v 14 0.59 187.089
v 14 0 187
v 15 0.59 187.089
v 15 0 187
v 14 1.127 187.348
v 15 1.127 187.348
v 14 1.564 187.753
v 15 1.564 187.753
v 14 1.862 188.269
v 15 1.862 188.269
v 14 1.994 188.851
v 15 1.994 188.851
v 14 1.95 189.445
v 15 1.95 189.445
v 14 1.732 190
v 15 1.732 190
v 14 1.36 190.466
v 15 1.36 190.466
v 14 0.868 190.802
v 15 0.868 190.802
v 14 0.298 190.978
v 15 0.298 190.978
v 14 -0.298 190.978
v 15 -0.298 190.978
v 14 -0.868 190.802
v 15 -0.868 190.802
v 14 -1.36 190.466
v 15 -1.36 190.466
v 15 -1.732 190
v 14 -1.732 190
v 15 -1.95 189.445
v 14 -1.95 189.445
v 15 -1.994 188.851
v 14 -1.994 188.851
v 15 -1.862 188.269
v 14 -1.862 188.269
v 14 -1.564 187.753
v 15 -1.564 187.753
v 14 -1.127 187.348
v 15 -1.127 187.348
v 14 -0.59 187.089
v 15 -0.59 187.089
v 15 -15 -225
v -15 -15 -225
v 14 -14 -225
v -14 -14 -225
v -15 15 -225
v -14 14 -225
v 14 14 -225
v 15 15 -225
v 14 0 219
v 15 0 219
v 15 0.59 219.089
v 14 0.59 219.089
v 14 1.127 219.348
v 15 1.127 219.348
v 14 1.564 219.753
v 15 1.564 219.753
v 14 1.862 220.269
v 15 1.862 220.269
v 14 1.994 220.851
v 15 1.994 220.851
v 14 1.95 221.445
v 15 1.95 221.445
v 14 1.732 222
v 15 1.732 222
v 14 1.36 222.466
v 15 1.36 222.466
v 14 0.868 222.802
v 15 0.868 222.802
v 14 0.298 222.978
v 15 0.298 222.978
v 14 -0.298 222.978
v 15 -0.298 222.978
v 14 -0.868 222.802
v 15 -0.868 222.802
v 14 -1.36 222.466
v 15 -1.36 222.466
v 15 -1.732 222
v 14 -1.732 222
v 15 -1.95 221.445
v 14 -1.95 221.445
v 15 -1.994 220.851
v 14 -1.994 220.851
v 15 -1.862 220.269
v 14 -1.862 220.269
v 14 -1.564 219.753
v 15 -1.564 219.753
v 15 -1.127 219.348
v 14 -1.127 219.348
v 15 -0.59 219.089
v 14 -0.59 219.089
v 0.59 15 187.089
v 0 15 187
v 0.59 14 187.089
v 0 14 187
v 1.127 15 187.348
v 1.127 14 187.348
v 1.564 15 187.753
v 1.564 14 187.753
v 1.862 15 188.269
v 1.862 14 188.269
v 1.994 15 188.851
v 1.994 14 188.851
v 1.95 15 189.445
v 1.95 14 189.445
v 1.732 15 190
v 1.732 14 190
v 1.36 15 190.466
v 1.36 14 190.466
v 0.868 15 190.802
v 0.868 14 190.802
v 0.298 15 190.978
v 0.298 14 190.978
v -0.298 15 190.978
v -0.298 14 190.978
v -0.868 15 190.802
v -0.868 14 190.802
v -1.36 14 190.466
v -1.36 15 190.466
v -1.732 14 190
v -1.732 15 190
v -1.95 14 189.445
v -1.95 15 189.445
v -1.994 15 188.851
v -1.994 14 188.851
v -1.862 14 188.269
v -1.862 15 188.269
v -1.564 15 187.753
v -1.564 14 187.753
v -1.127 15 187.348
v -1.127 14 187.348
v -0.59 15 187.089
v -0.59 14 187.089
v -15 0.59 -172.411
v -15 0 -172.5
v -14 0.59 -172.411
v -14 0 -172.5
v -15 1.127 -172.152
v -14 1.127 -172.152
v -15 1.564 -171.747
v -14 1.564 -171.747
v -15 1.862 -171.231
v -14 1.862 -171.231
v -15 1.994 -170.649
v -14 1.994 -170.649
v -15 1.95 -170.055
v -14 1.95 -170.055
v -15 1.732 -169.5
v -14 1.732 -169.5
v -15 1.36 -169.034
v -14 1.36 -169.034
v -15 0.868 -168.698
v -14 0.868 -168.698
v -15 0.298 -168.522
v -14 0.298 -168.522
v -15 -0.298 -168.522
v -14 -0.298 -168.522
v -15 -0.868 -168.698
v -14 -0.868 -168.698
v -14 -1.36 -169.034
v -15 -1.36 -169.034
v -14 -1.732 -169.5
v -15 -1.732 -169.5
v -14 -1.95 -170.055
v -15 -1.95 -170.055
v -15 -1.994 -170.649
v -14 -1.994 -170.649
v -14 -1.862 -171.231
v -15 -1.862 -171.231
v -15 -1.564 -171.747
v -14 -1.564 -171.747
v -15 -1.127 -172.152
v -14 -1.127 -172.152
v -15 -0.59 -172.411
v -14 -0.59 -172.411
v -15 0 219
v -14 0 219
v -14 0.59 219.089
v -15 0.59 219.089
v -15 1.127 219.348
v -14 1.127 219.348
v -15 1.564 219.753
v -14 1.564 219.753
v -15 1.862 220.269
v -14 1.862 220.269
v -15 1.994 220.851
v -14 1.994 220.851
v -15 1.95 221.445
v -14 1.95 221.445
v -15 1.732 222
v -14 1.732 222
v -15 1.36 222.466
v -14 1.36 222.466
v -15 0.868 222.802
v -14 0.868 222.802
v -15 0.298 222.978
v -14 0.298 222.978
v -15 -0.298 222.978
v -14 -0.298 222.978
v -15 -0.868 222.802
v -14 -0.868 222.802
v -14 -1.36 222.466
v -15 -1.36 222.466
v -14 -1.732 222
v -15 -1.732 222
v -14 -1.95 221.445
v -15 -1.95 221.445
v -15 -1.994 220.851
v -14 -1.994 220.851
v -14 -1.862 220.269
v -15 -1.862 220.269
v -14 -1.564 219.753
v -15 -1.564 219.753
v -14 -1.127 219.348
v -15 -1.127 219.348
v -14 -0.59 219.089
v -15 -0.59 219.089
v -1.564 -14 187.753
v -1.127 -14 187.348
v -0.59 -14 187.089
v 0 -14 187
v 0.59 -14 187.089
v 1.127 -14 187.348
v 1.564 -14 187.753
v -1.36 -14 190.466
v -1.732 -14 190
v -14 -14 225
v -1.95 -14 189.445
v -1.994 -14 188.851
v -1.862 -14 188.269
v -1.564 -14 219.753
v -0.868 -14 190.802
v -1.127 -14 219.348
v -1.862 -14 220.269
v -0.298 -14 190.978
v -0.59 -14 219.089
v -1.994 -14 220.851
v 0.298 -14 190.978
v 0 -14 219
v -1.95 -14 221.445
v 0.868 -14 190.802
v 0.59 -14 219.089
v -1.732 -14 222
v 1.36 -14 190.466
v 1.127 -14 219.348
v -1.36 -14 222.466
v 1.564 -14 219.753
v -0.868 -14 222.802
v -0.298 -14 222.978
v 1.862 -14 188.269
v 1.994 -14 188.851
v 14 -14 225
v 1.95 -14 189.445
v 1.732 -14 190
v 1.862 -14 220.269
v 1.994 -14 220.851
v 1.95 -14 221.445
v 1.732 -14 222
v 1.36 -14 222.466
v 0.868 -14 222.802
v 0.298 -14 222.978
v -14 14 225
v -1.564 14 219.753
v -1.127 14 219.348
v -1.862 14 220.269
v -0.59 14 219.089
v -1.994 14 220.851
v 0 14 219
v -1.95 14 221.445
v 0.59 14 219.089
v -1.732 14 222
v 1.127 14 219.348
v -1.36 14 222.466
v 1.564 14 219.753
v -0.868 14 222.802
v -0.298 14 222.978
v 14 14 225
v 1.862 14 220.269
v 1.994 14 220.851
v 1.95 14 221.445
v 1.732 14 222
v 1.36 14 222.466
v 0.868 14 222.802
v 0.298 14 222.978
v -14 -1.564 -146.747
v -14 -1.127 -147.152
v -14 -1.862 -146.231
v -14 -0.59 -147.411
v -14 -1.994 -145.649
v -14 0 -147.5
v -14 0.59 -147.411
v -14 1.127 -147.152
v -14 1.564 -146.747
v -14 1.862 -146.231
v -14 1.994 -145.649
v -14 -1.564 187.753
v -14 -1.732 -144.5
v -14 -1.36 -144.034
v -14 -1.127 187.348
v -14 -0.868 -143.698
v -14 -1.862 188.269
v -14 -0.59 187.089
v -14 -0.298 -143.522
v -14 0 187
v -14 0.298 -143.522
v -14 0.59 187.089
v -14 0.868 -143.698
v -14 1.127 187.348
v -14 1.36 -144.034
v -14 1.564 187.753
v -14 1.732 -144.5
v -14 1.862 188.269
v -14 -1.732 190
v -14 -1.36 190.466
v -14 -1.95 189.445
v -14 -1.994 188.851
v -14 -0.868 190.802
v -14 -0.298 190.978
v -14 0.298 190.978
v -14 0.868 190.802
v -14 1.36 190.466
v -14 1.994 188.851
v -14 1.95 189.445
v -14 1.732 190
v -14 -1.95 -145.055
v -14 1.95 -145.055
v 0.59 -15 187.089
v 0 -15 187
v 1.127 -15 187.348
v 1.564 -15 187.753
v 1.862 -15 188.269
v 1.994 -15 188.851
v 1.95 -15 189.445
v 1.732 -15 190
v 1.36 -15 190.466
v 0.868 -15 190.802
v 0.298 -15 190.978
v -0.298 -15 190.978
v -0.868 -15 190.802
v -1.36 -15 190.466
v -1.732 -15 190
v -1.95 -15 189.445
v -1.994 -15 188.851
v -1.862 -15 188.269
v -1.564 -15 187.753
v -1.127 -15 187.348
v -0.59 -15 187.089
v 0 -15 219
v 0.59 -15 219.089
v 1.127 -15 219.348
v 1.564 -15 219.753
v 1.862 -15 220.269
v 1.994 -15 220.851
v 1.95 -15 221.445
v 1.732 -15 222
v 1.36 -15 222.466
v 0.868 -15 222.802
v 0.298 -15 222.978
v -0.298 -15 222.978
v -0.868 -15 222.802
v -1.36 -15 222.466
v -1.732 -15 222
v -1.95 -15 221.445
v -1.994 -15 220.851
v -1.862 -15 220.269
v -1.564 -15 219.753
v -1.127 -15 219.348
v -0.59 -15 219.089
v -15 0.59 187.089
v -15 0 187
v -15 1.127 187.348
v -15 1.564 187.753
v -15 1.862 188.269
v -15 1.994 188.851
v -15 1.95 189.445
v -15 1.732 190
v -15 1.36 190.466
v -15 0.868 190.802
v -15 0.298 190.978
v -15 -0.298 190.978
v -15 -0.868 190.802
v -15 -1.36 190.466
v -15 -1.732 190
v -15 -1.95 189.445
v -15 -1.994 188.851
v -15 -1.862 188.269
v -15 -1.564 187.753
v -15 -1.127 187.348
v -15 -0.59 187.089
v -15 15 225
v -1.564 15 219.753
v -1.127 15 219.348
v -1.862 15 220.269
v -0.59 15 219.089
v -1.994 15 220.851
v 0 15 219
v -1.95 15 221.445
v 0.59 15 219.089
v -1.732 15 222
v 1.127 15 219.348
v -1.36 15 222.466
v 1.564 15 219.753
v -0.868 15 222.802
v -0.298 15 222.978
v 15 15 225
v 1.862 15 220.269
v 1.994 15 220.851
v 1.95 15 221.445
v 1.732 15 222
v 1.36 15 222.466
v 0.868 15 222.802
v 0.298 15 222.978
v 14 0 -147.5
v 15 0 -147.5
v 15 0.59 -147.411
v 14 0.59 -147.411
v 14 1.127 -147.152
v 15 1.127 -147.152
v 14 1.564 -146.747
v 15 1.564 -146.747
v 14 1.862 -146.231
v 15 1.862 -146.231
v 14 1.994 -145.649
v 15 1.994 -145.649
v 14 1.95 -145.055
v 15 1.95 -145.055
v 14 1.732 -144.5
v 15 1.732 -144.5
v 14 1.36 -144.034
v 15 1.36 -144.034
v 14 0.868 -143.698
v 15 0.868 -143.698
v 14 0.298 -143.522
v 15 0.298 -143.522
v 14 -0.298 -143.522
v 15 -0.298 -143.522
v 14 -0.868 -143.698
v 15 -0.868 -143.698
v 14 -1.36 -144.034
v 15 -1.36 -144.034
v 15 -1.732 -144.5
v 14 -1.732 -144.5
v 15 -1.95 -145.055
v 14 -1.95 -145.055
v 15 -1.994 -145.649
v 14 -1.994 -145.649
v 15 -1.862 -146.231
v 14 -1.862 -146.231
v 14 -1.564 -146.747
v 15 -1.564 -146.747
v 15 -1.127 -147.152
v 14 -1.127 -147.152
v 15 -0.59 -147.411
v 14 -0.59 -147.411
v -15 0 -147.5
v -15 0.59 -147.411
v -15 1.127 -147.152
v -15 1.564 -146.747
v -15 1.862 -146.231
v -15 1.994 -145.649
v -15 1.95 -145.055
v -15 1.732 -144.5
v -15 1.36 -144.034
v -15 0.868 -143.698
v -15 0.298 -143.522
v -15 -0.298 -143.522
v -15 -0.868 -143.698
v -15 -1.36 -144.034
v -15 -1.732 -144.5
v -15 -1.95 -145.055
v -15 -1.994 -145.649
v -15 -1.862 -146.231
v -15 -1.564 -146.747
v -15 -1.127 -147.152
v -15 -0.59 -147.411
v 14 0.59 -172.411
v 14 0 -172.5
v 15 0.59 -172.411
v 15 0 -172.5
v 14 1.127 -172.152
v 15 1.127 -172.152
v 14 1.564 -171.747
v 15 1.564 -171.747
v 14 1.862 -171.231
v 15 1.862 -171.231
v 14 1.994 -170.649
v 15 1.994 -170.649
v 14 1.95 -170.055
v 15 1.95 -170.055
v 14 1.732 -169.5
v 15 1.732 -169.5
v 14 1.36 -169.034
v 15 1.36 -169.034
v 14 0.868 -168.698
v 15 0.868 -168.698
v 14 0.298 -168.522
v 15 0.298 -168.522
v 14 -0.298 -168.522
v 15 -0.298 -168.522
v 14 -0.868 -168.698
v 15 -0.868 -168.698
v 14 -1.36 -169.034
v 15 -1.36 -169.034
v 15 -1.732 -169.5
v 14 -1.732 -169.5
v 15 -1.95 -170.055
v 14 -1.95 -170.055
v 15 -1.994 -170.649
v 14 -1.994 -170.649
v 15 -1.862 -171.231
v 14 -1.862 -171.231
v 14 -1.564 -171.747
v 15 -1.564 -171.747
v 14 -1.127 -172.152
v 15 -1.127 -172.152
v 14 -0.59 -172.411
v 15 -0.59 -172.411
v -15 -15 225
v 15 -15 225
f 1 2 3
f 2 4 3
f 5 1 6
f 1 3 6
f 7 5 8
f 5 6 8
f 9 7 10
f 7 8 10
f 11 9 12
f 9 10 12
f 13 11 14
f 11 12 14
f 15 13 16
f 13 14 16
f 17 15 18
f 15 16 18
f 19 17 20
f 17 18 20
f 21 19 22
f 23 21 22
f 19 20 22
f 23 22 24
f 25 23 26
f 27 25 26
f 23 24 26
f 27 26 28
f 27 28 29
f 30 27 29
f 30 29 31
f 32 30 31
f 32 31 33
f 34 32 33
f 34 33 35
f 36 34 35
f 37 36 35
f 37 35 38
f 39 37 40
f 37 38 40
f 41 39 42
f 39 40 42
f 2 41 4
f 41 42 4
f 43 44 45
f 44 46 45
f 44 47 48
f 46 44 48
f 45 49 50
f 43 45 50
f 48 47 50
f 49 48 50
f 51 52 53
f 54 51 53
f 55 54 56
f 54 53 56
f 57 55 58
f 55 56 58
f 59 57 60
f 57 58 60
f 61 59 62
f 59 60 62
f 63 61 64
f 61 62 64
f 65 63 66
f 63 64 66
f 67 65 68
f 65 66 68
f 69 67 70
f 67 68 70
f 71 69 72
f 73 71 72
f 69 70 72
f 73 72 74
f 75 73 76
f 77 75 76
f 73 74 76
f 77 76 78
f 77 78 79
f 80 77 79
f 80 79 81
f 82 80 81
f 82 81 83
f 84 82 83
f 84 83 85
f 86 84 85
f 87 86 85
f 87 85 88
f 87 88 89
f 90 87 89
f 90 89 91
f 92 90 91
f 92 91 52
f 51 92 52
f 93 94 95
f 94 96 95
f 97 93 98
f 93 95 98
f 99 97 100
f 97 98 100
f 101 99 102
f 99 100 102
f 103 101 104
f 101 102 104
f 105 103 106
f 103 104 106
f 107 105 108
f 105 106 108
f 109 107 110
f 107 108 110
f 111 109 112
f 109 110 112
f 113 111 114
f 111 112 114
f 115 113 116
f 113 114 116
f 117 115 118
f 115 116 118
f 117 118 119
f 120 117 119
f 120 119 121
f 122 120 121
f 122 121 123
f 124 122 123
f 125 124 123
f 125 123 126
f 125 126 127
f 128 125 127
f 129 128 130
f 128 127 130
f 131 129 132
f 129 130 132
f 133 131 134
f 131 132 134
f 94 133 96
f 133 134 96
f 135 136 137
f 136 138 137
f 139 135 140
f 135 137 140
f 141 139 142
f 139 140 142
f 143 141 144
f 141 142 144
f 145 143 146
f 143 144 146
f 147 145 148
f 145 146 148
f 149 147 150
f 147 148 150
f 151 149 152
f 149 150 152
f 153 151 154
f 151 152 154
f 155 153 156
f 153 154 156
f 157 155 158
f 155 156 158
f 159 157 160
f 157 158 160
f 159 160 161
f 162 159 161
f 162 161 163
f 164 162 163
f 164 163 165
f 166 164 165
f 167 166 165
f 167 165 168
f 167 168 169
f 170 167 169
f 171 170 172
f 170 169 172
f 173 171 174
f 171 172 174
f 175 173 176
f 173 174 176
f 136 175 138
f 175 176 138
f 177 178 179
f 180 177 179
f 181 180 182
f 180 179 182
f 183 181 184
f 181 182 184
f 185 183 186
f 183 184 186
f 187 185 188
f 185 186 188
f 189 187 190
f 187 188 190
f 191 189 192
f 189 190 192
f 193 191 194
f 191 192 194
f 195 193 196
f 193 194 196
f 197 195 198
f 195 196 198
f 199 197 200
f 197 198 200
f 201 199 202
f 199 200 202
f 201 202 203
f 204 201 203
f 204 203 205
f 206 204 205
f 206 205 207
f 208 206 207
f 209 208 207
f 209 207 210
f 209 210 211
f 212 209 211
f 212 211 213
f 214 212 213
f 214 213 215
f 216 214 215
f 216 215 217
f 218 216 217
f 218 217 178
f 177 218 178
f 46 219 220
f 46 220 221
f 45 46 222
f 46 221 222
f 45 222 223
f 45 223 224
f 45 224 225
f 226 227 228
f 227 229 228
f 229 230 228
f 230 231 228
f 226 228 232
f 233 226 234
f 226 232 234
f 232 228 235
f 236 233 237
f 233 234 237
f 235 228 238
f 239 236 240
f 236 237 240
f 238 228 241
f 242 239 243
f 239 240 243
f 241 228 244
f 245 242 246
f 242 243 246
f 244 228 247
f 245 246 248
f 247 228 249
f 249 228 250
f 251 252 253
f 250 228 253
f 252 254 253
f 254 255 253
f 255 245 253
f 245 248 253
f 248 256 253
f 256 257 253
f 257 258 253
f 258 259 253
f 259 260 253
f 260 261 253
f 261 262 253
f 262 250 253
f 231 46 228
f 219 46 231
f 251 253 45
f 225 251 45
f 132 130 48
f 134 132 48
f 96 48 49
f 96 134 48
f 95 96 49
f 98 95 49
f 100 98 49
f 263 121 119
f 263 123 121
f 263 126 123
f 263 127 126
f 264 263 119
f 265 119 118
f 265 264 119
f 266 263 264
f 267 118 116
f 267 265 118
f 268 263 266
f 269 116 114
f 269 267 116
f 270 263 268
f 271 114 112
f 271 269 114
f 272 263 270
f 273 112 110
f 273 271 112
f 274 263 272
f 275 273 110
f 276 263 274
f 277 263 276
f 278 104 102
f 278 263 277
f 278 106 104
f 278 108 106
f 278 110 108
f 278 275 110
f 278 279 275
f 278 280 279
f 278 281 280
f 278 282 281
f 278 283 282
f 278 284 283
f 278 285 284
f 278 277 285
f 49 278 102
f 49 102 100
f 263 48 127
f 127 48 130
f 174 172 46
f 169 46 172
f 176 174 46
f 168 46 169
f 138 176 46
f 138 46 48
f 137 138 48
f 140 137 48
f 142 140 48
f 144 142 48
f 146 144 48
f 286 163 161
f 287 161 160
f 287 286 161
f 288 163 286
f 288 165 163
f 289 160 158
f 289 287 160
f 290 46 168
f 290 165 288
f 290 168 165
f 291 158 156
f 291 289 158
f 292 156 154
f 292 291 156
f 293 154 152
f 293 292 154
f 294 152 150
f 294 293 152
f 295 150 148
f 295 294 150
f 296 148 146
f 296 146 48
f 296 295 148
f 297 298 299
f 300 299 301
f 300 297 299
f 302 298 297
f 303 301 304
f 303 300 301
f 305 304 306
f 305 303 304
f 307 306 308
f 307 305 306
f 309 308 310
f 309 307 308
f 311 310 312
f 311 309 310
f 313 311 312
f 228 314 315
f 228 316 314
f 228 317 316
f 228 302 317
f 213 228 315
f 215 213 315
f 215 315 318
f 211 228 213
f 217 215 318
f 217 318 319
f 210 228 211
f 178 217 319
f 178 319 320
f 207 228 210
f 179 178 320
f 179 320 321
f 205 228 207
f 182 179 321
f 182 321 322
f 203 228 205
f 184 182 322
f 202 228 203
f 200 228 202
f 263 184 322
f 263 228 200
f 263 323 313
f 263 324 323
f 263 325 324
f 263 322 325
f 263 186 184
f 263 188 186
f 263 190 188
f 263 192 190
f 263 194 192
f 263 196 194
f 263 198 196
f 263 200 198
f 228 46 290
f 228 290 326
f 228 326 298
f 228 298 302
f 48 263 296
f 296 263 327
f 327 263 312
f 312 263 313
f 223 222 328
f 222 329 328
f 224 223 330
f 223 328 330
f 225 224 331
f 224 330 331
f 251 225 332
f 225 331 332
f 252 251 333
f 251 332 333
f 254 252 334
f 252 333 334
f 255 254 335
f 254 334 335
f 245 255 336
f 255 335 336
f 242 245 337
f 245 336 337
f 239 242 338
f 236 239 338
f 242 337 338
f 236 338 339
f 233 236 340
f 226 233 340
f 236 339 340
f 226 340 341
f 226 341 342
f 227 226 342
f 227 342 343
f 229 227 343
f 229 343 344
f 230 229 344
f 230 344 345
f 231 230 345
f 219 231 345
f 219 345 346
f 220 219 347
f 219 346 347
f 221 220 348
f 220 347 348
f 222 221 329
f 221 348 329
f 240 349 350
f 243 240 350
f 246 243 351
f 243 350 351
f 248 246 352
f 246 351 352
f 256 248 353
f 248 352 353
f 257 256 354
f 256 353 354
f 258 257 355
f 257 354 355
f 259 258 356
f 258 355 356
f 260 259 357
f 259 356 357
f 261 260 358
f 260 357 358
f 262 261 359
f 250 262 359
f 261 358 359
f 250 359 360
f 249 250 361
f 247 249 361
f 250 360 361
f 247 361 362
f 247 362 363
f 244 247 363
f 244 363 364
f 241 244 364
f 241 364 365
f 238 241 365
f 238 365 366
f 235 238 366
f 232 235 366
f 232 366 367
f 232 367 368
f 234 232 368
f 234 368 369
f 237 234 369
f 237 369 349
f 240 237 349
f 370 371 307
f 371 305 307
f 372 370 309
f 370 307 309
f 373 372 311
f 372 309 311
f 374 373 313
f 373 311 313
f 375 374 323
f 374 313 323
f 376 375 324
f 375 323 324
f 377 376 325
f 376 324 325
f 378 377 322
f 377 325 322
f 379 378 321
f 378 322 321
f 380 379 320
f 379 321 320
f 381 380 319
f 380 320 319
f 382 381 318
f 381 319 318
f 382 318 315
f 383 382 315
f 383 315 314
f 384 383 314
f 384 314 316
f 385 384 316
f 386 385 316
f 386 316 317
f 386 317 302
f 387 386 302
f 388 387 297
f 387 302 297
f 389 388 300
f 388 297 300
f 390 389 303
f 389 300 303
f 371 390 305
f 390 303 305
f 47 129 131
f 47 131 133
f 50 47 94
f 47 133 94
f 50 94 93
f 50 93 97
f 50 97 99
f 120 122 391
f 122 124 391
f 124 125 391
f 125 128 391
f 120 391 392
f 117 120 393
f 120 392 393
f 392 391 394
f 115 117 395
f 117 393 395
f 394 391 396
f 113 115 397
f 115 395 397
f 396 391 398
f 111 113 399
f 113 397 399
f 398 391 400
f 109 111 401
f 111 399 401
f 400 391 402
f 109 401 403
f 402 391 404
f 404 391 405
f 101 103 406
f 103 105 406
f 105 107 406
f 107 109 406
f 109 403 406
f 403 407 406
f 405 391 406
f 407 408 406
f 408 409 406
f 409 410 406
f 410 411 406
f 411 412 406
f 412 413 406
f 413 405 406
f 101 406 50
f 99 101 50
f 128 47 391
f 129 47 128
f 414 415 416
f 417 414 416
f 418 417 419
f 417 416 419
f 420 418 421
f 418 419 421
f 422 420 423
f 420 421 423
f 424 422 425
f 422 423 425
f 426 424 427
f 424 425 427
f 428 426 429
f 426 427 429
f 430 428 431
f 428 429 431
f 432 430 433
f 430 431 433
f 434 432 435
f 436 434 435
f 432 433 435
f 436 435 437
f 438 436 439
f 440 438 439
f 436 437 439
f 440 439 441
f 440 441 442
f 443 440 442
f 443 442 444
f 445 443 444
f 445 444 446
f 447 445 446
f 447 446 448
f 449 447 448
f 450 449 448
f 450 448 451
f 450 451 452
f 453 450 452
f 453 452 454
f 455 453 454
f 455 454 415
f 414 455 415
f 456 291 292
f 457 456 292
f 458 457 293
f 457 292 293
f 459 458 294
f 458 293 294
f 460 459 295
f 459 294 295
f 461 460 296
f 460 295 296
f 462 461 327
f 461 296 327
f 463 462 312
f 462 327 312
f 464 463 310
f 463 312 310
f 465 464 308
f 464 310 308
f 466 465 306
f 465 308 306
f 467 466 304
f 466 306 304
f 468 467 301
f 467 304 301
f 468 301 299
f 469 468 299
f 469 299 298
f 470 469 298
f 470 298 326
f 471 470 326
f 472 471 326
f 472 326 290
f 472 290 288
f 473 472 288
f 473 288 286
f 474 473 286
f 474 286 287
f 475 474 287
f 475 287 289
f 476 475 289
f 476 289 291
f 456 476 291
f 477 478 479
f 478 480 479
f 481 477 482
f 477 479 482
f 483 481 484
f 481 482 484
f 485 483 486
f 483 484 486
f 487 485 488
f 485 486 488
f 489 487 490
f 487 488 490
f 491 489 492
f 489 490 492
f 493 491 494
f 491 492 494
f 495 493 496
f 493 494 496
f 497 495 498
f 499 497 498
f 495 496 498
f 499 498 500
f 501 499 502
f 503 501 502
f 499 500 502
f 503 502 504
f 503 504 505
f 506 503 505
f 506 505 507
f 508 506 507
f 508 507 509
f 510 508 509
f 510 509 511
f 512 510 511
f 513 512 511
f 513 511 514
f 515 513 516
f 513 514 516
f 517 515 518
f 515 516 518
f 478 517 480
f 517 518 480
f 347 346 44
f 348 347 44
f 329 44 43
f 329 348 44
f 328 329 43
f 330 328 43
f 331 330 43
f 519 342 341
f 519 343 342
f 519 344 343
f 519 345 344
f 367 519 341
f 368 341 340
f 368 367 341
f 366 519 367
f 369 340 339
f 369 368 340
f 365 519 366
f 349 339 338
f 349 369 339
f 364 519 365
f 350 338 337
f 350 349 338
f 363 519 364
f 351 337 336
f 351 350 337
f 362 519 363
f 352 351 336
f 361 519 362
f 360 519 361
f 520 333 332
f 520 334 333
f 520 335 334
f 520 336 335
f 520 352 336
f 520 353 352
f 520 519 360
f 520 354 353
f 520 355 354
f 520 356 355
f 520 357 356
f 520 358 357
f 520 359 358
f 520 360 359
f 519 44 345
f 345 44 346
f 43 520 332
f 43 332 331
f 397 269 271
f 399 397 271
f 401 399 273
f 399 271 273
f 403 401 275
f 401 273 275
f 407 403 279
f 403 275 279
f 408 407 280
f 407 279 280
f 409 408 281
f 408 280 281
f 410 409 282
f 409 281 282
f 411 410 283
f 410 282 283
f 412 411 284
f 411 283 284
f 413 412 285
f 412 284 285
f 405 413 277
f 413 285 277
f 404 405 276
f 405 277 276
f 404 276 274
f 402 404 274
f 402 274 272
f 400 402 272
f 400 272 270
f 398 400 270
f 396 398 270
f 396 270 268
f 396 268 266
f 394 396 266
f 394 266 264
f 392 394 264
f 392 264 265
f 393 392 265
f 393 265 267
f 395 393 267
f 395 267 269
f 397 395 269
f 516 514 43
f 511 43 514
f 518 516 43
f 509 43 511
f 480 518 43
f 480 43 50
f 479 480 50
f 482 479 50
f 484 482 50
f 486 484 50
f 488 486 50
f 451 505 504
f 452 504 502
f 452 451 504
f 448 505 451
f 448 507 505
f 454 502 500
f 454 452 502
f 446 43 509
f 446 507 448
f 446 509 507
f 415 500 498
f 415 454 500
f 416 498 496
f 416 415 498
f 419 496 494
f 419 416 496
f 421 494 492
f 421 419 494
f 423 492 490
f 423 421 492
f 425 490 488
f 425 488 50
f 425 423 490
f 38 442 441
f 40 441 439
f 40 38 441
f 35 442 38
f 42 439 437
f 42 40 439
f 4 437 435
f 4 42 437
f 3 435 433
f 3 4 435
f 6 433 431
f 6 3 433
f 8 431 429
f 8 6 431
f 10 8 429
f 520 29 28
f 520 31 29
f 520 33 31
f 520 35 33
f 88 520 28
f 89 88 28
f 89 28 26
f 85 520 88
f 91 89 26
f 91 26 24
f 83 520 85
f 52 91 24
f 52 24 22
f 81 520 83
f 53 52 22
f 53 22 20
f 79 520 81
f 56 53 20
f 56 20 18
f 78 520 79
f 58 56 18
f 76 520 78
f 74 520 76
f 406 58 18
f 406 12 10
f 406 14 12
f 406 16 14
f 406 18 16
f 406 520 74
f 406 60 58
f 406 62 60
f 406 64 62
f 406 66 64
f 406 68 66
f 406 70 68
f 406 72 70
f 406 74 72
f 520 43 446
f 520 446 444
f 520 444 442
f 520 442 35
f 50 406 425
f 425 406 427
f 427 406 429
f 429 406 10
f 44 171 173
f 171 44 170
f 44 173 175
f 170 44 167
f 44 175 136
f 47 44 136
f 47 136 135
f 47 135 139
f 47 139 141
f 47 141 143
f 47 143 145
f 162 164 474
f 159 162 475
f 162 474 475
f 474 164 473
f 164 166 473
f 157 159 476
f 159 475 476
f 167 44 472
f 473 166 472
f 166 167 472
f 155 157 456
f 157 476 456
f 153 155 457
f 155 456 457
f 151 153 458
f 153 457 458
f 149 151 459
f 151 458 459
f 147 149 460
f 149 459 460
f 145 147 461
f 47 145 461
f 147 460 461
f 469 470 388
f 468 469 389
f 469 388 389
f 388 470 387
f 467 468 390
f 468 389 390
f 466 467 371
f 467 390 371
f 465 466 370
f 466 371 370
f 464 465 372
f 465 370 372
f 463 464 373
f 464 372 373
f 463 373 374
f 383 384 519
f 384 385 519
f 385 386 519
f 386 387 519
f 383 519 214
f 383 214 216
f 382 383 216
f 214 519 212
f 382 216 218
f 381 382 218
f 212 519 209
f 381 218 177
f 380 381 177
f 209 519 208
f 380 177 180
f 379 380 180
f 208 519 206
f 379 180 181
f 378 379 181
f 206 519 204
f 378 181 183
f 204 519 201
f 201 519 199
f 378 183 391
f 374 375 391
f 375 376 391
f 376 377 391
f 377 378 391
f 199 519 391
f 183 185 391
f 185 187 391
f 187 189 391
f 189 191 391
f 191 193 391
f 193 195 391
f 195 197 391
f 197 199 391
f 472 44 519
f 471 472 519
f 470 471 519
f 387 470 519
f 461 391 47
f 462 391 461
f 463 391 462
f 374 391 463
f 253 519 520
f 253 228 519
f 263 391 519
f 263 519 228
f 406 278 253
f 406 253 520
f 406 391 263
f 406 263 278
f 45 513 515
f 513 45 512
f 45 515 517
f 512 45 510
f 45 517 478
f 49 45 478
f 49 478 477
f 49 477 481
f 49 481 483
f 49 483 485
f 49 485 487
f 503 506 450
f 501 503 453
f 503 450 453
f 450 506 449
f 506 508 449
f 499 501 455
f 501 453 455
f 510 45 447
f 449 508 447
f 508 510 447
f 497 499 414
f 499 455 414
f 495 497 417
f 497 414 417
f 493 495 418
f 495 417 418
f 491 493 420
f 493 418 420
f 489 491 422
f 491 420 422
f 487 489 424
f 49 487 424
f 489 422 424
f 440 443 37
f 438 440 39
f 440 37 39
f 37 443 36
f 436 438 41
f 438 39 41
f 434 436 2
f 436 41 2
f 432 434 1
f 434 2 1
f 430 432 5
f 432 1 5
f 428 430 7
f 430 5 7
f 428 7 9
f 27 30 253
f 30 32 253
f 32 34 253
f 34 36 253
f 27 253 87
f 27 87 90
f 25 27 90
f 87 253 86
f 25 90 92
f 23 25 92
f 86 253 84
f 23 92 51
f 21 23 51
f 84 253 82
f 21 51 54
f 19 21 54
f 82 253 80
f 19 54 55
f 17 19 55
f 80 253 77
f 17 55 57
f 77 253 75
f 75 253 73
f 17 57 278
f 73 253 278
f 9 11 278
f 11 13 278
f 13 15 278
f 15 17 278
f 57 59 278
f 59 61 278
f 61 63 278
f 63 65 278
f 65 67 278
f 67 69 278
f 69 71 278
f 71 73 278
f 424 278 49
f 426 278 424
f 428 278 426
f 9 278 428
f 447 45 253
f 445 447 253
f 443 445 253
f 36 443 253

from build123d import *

# Parameters (mm, degrees)
SKETCH_1_W          = 30
SKETCH_1_H          = 30
SKETCH_1_W_2        = 28
SKETCH_1_H_2        = 28
EXTRUDE_1_DEPTH     = 225
SKETCH_2_R          = 2
CUT_EXTRUDE_1_DEPTH = 65
SKETCH_4_R          = 2
CUT_EXTRUDE_2_DEPTH = 45
SKETCH_5_R          = 2
CUT_EXTRUDE_3_DEPTH = 45


with BuildPart() as part:
    # 草图1 → 凸台-拉伸1 (new, symmetric)
    with BuildSketch(Plane.XY):
        Rectangle(SKETCH_1_W, SKETCH_1_H)
        Rectangle(SKETCH_1_W_2, SKETCH_1_H_2, mode=Mode.SUBTRACT)
    extrude(amount=EXTRUDE_1_DEPTH, both=True)

    # 草图2 → 切除-拉伸1 (cut, symmetric)
    with BuildSketch(Plane(origin=(15, 0, 0), x_dir=(0, 0, -1), z_dir=(1, 0, 0))):
        with Locations((145.5, 0)):
            Circle(SKETCH_2_R)
        with Locations((170.5, 0)):
            Circle(SKETCH_2_R)
    extrude(amount=CUT_EXTRUDE_1_DEPTH, both=True, mode=Mode.SUBTRACT)

    # 草图4 → 切除-拉伸2 (cut, symmetric)
    with BuildSketch(Plane.XZ.offset(15)):
        with Locations(Location((0, 221, 0), (0, 0, 270))):
            Circle(SKETCH_4_R)
        with Locations(Location((0, 189, 0), (0, 0, 270))):
            Circle(SKETCH_4_R)
    extrude(amount=CUT_EXTRUDE_2_DEPTH, both=True, mode=Mode.SUBTRACT)

    # 草图5 → 切除-拉伸3 (cut, symmetric)
    with BuildSketch(Plane(origin=(15, 0, 0), x_dir=(0, 0, -1), z_dir=(1, 0, 0))):
        with Locations((-221, 0)):
            Circle(SKETCH_5_R)
        with Locations((-189, 0)):
            Circle(SKETCH_5_R)
    extrude(amount=CUT_EXTRUDE_3_DEPTH, both=True, mode=Mode.SUBTRACT)


solid = part.part
